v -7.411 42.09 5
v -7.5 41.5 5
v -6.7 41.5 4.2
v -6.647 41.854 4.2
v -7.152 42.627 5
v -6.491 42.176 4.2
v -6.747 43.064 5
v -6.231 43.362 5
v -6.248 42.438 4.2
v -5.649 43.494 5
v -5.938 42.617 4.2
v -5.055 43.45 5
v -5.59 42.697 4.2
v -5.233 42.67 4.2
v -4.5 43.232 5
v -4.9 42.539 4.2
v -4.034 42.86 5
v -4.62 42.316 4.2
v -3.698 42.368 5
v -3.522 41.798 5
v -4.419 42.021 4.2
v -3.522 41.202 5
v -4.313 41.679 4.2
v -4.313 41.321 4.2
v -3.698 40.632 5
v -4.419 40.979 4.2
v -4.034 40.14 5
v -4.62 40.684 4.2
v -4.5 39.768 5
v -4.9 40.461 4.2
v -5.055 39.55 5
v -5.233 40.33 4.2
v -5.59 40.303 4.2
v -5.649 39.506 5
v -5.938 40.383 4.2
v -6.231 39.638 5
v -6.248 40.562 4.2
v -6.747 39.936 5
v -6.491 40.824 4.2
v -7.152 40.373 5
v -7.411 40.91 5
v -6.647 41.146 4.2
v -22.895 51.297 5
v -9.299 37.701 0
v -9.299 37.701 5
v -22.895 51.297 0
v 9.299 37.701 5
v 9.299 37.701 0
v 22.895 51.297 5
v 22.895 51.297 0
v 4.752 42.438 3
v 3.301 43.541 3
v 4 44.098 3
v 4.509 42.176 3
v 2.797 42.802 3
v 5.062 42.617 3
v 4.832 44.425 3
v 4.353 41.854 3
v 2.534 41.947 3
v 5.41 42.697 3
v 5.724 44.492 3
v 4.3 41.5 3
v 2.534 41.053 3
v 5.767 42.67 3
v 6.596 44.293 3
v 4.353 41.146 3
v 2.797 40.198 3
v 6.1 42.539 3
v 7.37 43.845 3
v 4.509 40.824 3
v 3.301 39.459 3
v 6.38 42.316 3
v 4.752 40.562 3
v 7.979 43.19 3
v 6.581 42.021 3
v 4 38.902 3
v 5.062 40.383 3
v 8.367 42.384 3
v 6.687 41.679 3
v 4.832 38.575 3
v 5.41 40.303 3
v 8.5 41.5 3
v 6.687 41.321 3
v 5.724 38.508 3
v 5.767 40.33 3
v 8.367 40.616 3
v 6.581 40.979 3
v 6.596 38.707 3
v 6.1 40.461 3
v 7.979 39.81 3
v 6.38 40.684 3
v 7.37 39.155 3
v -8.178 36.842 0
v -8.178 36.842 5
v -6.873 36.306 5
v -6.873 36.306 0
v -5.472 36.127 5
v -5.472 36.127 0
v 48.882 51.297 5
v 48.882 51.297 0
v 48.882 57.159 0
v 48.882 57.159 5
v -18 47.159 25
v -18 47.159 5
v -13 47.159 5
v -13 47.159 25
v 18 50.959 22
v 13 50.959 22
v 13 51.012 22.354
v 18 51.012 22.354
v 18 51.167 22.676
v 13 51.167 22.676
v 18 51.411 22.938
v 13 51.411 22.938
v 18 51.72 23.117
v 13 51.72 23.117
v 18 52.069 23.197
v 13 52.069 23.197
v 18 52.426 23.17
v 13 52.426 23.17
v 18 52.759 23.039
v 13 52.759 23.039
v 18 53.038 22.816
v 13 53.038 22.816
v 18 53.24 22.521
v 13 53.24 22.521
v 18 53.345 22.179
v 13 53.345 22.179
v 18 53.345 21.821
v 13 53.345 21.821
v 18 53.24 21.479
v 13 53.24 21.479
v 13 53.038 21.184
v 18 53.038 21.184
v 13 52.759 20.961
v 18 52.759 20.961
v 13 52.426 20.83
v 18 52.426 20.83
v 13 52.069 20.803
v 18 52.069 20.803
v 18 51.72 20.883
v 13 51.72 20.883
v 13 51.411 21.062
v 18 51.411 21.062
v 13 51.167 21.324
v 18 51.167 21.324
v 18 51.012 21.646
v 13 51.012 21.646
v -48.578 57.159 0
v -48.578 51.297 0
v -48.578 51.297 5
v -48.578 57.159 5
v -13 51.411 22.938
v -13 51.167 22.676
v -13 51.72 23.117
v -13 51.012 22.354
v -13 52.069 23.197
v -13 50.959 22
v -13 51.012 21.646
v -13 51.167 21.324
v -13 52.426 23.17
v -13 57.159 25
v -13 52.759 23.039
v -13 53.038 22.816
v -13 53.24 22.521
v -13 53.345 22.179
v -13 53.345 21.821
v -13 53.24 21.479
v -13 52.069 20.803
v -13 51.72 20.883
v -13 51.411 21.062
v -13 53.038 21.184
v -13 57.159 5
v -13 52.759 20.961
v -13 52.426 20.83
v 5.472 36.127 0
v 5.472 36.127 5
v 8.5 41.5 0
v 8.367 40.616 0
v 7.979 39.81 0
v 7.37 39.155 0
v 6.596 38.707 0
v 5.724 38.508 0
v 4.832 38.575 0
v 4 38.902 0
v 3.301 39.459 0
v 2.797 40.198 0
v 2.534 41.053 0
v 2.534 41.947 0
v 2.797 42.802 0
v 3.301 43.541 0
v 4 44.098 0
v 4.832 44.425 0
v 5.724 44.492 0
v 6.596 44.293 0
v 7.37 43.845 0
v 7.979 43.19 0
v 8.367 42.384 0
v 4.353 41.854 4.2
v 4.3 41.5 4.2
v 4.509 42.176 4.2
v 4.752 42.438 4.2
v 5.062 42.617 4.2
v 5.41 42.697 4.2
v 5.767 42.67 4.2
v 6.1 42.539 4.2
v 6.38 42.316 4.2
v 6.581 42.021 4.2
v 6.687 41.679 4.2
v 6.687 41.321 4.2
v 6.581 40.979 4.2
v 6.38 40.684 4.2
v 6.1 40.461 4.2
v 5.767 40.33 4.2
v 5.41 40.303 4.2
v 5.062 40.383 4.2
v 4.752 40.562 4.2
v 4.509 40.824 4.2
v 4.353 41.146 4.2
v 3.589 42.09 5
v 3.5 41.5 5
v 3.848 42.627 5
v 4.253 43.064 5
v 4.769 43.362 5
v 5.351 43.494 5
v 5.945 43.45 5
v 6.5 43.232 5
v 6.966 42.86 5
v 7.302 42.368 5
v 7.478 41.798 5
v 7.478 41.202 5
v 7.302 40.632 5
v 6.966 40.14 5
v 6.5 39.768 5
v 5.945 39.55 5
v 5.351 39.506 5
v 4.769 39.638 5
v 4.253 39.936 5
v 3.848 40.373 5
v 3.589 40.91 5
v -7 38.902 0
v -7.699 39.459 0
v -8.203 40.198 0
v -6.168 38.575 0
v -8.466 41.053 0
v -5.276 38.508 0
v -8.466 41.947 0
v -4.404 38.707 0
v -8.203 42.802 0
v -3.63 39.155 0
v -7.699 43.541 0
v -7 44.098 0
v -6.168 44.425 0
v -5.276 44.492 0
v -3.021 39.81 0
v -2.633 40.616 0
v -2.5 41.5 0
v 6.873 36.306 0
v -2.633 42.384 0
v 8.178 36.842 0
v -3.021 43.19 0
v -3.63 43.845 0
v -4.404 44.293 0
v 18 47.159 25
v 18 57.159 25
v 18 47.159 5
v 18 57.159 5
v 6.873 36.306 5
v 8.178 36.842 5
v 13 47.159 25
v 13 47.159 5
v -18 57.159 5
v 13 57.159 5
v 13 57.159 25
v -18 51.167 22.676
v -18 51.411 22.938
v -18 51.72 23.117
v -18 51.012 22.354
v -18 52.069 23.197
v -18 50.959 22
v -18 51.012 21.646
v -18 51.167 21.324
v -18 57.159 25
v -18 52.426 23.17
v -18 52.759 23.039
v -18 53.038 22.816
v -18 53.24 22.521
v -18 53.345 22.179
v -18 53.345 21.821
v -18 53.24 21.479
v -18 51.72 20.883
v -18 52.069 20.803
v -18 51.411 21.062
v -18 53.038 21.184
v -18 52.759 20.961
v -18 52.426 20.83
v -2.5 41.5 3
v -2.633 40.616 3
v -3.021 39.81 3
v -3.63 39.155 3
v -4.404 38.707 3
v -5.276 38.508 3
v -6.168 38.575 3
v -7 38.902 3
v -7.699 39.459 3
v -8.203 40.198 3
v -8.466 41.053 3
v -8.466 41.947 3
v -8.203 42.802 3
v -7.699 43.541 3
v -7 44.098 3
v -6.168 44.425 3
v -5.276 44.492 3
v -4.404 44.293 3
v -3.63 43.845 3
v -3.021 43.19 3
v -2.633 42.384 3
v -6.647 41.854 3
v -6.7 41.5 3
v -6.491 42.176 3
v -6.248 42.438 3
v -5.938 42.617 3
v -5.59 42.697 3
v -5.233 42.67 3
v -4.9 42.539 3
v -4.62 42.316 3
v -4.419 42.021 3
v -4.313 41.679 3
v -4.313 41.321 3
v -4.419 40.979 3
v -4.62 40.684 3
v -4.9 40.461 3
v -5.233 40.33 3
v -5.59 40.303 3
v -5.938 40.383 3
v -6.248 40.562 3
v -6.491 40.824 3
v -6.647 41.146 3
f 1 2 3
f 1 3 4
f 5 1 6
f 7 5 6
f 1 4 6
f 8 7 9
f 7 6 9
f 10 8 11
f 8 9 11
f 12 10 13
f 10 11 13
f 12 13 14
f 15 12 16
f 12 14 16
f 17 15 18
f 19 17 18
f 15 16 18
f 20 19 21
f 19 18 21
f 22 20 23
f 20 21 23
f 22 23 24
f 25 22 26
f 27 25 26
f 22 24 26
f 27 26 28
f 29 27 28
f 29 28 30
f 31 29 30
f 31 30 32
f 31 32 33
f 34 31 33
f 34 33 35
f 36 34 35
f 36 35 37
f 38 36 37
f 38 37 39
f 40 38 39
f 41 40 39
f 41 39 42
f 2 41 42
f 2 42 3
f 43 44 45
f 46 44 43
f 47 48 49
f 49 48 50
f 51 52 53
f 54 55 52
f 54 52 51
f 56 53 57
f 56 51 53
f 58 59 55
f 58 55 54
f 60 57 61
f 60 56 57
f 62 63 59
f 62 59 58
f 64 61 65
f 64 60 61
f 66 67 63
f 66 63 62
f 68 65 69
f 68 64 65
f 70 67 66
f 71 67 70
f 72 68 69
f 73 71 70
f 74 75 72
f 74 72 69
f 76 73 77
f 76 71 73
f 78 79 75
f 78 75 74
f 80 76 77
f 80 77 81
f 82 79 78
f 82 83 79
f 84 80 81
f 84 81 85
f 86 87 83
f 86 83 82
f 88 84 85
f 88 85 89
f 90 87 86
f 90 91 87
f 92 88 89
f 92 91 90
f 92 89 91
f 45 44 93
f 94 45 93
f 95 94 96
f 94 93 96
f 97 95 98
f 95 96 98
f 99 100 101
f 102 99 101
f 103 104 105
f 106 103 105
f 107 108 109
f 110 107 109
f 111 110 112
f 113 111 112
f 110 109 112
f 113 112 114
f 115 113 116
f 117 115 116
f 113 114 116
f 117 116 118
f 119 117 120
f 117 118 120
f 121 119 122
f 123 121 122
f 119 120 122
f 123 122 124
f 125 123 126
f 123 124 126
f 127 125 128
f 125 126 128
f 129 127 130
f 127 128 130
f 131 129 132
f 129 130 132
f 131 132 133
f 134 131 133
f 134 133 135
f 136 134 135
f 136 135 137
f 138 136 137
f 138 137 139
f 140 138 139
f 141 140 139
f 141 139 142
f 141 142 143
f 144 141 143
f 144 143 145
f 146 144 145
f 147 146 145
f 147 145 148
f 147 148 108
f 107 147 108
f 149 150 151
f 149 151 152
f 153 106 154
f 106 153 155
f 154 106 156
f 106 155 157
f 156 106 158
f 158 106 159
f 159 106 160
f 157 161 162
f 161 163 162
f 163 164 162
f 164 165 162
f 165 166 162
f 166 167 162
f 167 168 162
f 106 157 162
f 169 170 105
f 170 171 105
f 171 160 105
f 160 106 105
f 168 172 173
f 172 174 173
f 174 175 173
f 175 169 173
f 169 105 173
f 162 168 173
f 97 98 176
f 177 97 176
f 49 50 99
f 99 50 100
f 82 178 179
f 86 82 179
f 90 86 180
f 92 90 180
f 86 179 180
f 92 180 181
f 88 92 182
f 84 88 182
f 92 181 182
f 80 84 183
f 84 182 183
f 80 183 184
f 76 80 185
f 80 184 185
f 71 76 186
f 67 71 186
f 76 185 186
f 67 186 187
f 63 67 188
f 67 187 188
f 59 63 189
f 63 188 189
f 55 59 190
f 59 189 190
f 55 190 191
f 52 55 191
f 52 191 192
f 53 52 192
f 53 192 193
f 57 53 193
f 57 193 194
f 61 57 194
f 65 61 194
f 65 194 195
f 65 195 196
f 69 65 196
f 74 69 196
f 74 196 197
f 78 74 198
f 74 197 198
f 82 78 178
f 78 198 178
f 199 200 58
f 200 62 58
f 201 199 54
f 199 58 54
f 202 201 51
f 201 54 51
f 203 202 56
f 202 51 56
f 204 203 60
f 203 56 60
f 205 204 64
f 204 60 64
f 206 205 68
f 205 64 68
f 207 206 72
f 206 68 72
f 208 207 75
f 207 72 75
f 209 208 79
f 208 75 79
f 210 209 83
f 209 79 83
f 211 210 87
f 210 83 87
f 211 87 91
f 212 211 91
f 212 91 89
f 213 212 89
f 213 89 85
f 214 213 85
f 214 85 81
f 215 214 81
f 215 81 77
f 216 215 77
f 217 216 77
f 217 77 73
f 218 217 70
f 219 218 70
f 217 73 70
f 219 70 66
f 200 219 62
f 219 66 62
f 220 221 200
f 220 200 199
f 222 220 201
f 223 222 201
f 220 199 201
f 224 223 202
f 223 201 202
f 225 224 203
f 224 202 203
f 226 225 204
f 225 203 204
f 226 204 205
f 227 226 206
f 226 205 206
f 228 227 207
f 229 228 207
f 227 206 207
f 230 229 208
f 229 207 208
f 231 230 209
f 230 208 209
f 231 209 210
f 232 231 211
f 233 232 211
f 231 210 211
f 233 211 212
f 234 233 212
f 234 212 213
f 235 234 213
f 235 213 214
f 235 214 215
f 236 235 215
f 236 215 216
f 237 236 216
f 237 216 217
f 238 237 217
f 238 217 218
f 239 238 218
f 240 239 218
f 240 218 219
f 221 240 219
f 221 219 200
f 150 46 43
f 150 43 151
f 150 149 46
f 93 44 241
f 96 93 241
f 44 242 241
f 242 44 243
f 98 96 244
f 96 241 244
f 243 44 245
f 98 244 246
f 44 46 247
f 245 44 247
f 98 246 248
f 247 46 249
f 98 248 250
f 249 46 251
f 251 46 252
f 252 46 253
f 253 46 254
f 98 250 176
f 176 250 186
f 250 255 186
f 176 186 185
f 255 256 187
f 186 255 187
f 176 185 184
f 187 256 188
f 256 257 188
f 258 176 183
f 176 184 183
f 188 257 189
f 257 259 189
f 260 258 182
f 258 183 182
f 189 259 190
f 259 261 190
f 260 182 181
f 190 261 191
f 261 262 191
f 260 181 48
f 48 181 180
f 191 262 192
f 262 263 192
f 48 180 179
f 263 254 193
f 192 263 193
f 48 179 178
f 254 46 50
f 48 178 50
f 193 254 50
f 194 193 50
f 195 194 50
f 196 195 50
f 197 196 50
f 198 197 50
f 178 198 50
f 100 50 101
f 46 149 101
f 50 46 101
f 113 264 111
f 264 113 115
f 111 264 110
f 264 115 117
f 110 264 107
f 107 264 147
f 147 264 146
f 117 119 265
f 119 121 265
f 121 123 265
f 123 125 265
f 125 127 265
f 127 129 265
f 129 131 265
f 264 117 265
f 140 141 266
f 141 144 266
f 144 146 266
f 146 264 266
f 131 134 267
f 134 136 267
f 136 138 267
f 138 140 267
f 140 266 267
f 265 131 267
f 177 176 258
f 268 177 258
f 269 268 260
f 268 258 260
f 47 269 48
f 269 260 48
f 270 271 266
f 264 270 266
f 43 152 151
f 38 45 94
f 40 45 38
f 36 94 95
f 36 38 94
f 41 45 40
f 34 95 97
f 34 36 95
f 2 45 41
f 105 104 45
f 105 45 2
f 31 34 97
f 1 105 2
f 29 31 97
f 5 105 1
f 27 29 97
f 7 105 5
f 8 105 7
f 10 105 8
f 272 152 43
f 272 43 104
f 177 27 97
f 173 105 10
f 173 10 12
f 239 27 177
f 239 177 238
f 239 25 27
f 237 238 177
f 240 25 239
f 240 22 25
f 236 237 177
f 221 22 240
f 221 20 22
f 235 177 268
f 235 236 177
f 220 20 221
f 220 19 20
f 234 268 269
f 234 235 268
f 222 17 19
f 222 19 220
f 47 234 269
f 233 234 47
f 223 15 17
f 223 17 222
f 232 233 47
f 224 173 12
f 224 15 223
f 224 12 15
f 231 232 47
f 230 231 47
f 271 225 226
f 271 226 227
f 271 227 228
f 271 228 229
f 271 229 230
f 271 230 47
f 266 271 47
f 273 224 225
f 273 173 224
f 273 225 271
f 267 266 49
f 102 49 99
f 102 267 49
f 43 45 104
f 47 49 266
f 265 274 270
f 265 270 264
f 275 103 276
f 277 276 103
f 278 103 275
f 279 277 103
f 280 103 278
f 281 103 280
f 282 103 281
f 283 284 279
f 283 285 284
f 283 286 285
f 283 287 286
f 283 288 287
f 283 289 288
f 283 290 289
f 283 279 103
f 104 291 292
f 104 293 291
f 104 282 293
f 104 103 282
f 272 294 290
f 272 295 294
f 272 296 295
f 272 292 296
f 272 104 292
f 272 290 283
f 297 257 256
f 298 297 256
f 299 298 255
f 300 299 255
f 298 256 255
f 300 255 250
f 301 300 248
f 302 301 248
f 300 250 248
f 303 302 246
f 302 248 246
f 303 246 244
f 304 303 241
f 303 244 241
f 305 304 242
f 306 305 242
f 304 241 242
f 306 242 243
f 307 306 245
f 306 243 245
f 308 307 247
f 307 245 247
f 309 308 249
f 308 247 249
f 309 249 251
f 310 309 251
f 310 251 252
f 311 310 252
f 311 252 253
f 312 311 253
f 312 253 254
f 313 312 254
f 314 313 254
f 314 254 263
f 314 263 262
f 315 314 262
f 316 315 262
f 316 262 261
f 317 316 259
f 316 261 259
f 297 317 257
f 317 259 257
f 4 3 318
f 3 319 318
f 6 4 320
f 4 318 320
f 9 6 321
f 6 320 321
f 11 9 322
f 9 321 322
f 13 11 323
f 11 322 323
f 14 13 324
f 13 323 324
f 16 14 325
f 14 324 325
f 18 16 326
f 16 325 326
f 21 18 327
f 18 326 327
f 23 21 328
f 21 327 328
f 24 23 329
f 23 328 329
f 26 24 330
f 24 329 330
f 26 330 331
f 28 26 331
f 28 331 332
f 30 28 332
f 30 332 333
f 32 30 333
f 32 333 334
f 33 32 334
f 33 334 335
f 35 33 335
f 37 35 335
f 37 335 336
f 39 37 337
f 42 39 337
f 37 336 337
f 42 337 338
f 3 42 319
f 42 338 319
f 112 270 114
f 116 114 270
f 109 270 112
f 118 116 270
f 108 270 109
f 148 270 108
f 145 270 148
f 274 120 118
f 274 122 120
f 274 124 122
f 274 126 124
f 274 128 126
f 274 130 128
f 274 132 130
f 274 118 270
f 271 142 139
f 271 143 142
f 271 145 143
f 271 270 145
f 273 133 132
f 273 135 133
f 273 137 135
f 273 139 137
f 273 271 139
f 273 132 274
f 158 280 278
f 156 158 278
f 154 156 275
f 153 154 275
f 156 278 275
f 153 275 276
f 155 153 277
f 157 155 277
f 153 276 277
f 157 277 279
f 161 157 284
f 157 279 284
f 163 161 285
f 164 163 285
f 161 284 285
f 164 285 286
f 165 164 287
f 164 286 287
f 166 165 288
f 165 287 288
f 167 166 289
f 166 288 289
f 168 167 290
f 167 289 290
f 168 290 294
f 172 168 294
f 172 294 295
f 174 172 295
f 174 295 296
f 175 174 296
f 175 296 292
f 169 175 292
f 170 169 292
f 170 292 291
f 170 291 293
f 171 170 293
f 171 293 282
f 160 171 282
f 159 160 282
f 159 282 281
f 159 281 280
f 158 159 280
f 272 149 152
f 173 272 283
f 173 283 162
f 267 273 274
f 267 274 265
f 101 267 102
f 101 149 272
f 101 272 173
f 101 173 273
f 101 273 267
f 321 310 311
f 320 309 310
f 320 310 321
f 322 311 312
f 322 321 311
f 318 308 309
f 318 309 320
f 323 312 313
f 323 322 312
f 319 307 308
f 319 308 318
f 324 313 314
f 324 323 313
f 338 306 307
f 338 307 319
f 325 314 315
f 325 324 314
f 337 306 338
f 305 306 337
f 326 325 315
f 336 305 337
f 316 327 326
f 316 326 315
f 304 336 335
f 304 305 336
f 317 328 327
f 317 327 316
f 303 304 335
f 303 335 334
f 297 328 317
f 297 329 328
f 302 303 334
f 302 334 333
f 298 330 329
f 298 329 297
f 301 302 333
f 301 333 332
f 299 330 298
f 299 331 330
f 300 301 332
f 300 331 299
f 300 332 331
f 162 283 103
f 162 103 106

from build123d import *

# Parameters (mm, degrees)
PAD_DEPTH        = 5
SKETCH004_R      = 3
POCKET_DEPTH     = 3
HOLE_D           = 2.4
HOLE_CSINK_D     = 4
HOLE_CSINK_ANGLE = 90
SKETCH006_W      = 5
SKETCH006_H      = 10
PAD001_DEPTH     = 20
SKETCH007_W      = 5
SKETCH007_H      = 10
PAD002_DEPTH     = 20
SKETCH008_R      = 1.2
HOLE001_DEPTH    = 66.882828


with BuildPart() as part:
    # Sketch → Pad (new body)
    with BuildSketch(Plane.XY):
        with BuildLine():
            ThreePointArc((-9.299092, 37.700908), (-7.543295, 36.530982), (-5.472396, 36.127344))
            Line((-5.472396, 36.127344), (5.472396, 36.127344))
            ThreePointArc((5.472396, 36.127344), (7.543295, 36.530982), (9.299092, 37.700908))
            Line((9.299092, 37.700908), (22.895203, 51.297019))
            Line((22.895203, 51.297019), (48.881828, 51.297019))
            Line((48.881828, 51.297019), (48.881828, 57.158768))
            Line((-48.578125, 57.158768), (48.881828, 57.158768))
            Line((-48.578125, 51.297019), (-48.578125, 57.158768))
            Line((-22.895203, 51.297019), (-48.578125, 51.297019))
            Line((-9.299092, 37.700908), (-22.895203, 51.297019))
        make_face()
    extrude(amount=PAD_DEPTH)

    # Sketch004 (on Face11 of Pad) → Pocket (cut)
    with BuildSketch(Plane(origin=(0, 0, 0), x_dir=(1, 0, 0), z_dir=(0, 0, -1))):
        with Locations((-5.5, -41.5)):
            Circle(SKETCH004_R)
        with Locations((5.5, -41.5)):
            Circle(SKETCH004_R)
    extrude(amount=-POCKET_DEPTH, mode=Mode.SUBTRACT)

    # Hole (through all)
    with Locations(Plane.XY.offset(5)):
        with Locations((-5.5, 41.5), (5.5, 41.5)):
            CounterSinkHole(HOLE_D / 2, HOLE_CSINK_D / 2, counter_sink_angle=HOLE_CSINK_ANGLE)

    # Sketch006 (on Face5 of Hole) → Pad001 (join)
    with BuildSketch(Plane.XY.offset(5)):
        with Locations((-15.5, 52.158768)):
            Rectangle(SKETCH006_W, SKETCH006_H)
    extrude(amount=PAD001_DEPTH)

    # Sketch007 (on Face5 of Pad001) → Pad002 (join)
    with BuildSketch(Plane.XY.offset(5)):
        with Locations((15.5, 52.158768)):
            Rectangle(SKETCH007_W, SKETCH007_H)
    extrude(amount=PAD002_DEPTH)

    # Sketch008 (on Face15 of Pad002) → Hole001 (cut, through all)
    with BuildSketch(Plane(origin=(-18, 0, 0), x_dir=(0, -1, 0), z_dir=(-1, 0, 0))):
        with Locations((-52.158768, 22)):
            Circle(SKETCH008_R)
    extrude(amount=-HOLE001_DEPTH, mode=Mode.SUBTRACT)


solid = part.part
